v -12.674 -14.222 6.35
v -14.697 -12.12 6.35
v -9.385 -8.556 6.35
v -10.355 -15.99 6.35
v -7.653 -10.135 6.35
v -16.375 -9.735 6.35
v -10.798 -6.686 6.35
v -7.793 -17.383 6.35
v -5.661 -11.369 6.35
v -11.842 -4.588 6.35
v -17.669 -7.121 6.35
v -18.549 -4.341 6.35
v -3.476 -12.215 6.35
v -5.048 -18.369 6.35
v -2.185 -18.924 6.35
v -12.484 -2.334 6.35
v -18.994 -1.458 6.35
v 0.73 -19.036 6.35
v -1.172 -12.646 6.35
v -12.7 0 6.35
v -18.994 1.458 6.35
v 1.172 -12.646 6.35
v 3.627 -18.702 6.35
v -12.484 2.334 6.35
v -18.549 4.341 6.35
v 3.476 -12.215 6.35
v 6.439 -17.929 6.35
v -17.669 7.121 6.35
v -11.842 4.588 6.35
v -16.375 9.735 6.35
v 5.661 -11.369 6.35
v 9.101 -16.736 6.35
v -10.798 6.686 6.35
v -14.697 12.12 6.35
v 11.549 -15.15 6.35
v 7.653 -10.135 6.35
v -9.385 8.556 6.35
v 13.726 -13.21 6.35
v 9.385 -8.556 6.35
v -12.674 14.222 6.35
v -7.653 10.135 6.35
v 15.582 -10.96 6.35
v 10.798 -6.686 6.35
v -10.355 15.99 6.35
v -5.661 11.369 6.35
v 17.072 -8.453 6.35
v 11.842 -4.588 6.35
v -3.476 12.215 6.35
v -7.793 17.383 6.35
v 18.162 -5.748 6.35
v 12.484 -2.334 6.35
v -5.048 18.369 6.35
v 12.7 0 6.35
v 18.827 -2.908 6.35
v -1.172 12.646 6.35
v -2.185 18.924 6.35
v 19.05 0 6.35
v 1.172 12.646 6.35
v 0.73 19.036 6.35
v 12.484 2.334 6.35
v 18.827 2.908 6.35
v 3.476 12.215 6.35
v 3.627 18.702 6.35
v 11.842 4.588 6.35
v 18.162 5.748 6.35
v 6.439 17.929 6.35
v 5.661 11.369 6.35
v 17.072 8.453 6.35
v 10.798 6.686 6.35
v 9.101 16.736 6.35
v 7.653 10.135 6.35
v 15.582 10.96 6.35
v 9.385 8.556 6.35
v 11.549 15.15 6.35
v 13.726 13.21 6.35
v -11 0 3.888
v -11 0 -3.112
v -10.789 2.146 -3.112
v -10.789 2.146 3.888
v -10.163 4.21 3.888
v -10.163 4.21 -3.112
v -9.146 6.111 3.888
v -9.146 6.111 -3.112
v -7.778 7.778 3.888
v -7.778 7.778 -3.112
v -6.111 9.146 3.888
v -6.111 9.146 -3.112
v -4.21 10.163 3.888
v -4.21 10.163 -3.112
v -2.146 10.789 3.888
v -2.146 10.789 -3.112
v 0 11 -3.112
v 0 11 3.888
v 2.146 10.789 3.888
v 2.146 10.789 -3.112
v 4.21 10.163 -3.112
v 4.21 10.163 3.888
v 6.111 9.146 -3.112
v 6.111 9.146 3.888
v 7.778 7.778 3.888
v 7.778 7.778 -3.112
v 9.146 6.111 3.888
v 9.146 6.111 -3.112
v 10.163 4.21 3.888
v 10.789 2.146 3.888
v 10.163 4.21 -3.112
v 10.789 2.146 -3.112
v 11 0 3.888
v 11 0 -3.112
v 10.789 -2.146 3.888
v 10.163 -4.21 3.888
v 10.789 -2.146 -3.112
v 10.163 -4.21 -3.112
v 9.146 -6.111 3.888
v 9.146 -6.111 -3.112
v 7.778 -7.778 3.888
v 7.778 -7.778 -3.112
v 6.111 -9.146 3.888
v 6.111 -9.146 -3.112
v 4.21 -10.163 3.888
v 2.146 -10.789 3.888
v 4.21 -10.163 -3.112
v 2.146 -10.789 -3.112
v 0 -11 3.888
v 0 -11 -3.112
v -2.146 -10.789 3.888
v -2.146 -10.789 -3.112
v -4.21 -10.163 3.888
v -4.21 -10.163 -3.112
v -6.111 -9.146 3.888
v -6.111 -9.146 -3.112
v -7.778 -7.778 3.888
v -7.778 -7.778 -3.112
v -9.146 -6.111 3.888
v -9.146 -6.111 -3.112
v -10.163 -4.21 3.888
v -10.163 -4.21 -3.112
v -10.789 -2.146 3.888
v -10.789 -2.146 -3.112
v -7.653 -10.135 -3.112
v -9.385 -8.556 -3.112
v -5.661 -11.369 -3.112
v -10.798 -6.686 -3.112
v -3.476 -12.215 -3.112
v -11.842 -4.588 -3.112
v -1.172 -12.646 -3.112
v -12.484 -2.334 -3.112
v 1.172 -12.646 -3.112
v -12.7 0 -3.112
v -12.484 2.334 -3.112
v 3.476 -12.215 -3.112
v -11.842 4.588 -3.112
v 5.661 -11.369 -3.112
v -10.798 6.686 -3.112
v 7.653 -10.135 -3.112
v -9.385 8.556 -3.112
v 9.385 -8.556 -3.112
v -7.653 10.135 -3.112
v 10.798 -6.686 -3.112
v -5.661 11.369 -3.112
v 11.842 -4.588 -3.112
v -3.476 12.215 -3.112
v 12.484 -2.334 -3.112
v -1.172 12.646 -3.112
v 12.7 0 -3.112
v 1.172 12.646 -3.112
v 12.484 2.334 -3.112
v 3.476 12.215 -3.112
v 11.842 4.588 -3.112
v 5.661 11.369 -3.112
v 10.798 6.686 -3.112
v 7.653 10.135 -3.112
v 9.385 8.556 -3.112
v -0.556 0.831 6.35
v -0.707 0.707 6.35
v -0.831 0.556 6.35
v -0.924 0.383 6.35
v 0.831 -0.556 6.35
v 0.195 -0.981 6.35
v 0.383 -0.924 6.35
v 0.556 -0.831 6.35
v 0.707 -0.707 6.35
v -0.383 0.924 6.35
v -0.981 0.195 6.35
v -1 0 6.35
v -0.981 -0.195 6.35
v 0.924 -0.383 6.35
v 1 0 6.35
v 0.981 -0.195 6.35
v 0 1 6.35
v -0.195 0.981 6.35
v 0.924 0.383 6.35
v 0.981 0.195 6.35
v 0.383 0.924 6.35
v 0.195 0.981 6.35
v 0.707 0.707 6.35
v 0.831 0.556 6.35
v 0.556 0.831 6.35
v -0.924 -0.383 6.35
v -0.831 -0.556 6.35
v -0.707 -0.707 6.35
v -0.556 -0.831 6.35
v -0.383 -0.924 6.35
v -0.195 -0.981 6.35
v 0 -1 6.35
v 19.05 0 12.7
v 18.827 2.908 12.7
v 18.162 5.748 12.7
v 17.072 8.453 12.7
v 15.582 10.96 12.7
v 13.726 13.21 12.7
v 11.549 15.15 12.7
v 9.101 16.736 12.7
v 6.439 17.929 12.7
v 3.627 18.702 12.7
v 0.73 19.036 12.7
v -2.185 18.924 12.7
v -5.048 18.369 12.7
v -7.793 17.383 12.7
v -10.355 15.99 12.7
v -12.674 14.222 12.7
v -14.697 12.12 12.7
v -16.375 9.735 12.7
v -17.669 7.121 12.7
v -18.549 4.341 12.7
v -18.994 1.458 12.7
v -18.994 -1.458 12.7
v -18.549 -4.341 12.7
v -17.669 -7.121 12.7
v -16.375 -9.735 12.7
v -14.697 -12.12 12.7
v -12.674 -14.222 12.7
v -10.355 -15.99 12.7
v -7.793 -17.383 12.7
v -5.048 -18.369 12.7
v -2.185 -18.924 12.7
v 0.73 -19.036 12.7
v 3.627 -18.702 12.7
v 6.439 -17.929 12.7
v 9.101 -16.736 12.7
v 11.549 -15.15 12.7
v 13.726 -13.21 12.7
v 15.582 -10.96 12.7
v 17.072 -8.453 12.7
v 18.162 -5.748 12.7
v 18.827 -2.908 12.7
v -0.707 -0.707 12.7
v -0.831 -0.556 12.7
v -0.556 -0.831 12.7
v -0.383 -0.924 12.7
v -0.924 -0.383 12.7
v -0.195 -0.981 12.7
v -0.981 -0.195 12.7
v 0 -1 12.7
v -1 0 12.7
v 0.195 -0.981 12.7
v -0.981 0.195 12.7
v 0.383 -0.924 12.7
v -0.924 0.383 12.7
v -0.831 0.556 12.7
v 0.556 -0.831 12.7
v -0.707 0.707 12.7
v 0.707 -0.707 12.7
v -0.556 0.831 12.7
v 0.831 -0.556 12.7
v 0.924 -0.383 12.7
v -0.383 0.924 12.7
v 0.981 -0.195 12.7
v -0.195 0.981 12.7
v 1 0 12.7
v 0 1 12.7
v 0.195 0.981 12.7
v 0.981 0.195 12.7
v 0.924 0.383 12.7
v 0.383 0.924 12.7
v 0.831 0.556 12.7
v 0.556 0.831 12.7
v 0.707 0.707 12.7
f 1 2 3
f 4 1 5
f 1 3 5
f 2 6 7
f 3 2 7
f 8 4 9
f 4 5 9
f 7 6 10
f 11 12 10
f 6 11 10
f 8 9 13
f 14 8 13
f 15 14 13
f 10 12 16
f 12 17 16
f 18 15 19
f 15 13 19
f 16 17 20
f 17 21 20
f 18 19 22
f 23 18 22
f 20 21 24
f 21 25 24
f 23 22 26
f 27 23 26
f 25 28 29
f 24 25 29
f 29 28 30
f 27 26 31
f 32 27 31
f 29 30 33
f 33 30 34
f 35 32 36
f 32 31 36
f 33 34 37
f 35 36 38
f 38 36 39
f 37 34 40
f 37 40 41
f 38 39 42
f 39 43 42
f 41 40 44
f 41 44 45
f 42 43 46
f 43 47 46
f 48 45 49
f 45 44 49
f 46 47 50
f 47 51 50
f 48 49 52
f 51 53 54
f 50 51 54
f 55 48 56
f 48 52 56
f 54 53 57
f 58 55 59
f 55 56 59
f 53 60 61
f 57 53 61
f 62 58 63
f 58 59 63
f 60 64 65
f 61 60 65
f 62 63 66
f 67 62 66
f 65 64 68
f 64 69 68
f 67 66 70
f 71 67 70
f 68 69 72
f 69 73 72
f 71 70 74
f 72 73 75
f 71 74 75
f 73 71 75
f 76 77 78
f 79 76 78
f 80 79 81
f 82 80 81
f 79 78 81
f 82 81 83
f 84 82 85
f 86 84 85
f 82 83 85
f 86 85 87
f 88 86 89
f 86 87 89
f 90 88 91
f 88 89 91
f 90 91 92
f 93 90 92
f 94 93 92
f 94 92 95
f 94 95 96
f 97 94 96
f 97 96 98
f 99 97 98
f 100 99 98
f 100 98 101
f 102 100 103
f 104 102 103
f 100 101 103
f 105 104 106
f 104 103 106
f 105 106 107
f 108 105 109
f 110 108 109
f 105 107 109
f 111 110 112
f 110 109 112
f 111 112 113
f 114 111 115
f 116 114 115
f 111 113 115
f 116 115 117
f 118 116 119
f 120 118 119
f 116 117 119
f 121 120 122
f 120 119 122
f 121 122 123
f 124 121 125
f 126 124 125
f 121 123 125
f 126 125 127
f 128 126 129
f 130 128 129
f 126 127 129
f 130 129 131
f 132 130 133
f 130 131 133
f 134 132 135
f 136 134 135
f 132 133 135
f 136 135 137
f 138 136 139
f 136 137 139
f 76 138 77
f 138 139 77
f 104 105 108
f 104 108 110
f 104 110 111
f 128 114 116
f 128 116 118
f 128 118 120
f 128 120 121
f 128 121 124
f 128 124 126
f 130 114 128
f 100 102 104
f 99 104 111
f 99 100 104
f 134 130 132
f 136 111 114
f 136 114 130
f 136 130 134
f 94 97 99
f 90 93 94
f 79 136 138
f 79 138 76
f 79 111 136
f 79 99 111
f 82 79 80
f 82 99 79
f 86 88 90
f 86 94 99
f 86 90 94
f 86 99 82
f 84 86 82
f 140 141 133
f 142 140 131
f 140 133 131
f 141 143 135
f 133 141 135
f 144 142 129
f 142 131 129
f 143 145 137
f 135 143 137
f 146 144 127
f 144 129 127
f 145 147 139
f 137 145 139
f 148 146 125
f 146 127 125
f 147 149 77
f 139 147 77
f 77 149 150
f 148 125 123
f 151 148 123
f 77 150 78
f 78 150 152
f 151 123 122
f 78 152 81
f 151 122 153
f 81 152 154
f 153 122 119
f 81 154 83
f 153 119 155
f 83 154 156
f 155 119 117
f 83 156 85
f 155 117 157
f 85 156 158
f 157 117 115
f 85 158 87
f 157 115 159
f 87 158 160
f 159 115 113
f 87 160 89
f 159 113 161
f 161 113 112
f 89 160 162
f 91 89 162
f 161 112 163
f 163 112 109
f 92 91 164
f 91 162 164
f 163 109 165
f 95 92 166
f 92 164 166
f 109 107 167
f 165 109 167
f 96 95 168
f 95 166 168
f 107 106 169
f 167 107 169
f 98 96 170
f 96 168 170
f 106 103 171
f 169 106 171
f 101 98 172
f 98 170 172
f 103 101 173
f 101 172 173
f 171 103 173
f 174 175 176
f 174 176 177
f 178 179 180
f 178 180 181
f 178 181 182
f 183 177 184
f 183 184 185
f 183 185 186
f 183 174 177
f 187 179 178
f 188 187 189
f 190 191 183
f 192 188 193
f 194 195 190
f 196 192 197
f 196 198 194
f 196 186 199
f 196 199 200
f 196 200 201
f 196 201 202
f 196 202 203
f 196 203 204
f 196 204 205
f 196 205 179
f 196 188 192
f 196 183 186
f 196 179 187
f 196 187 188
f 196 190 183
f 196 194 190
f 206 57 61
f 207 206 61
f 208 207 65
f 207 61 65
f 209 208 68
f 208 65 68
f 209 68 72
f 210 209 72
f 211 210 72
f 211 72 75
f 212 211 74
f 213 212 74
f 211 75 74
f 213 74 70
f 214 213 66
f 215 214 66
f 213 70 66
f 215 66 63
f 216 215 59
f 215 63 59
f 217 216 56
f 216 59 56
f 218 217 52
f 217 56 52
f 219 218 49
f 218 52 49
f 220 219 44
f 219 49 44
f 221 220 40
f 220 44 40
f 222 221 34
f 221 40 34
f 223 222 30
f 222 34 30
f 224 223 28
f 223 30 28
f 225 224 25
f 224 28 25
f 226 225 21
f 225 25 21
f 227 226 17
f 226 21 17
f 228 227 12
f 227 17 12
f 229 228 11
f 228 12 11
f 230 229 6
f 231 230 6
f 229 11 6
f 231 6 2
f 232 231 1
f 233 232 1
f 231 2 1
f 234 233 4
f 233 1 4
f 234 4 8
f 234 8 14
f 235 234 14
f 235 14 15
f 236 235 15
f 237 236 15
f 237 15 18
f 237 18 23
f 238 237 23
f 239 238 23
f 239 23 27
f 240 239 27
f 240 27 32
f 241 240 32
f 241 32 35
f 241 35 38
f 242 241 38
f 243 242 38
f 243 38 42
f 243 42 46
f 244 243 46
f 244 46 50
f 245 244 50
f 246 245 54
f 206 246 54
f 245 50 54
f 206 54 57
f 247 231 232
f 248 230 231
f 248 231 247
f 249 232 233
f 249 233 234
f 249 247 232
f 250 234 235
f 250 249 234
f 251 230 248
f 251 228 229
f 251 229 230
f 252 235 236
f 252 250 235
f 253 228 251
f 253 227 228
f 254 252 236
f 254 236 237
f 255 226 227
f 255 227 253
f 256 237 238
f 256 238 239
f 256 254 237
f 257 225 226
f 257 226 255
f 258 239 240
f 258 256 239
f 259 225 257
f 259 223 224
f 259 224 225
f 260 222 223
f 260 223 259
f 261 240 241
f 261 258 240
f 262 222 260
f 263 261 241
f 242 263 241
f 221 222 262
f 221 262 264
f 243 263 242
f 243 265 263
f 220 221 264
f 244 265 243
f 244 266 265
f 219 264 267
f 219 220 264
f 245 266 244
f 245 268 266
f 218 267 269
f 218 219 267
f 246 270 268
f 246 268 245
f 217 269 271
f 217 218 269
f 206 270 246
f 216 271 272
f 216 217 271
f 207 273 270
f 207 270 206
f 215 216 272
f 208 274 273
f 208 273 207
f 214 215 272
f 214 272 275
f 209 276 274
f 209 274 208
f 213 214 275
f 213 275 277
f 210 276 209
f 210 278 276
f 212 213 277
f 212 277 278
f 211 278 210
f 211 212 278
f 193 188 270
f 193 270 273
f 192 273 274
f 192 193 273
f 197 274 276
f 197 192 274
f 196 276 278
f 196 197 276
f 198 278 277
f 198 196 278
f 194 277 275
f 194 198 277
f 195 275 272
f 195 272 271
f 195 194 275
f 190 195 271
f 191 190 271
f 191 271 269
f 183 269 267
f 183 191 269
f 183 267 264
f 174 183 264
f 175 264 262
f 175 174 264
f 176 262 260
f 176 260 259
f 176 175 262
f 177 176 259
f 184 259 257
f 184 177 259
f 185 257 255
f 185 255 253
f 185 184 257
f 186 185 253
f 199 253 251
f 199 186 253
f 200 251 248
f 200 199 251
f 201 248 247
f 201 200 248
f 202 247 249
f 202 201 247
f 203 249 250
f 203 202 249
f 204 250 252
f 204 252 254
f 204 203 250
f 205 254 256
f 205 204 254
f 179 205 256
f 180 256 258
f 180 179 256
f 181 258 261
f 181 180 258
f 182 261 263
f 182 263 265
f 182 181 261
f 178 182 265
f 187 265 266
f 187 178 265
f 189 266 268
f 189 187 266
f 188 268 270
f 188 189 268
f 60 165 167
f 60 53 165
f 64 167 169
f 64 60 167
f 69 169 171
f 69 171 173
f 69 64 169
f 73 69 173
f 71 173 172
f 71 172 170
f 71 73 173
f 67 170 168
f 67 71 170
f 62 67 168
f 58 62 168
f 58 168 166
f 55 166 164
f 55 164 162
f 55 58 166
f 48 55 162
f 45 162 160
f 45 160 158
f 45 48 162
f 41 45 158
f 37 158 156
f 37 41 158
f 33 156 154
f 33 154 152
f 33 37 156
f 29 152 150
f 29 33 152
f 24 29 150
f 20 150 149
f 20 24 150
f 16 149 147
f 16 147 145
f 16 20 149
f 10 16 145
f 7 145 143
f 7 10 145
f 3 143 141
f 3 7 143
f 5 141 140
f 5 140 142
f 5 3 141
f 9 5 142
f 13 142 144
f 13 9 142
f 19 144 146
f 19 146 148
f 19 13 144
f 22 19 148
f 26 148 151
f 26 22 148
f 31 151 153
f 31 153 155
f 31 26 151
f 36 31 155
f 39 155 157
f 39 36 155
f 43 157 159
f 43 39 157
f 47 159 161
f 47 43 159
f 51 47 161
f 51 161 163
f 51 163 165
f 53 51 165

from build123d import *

# Parameters (mm, degrees)
SKETCH2_R                = 12.7
BOSS_EXTRUDE1_DEPTH      = 6.35
BOSS_EXTRUDE1_DEPTH_BACK = 3.1115
SKETCH4_R                = 19.05
SKETCH4_R_2              = 1
BOSS_EXTRUDE2_DEPTH      = 6.35
SKETCH5_R                = 11
CUT_EXTRUDE1_DEPTH       = 7


with BuildPart() as part:
    # Sketch2 → Boss-Extrude1 (new body, two sides)
    with BuildSketch(Plane.XY) as boss_extrude1_sk:
        Circle(SKETCH2_R)
    extrude(amount=BOSS_EXTRUDE1_DEPTH)
    extrude(boss_extrude1_sk.sketch, amount=-BOSS_EXTRUDE1_DEPTH_BACK)

    # Sketch4 → Boss-Extrude2 (add)
    with BuildSketch(Plane.XY.offset(6.35)):
        Circle(SKETCH4_R)
        Circle(SKETCH4_R_2, mode=Mode.SUBTRACT)
    extrude(amount=BOSS_EXTRUDE2_DEPTH)

    # Sketch5 → Cut-Extrude1 (cut)
    with BuildSketch(Plane(origin=(0, 0, -3.1115), x_dir=(-1, 0, 0), z_dir=(0, 0, -1))):
        Circle(SKETCH5_R)
    extrude(amount=-CUT_EXTRUDE1_DEPTH, mode=Mode.SUBTRACT)


solid = part.part
